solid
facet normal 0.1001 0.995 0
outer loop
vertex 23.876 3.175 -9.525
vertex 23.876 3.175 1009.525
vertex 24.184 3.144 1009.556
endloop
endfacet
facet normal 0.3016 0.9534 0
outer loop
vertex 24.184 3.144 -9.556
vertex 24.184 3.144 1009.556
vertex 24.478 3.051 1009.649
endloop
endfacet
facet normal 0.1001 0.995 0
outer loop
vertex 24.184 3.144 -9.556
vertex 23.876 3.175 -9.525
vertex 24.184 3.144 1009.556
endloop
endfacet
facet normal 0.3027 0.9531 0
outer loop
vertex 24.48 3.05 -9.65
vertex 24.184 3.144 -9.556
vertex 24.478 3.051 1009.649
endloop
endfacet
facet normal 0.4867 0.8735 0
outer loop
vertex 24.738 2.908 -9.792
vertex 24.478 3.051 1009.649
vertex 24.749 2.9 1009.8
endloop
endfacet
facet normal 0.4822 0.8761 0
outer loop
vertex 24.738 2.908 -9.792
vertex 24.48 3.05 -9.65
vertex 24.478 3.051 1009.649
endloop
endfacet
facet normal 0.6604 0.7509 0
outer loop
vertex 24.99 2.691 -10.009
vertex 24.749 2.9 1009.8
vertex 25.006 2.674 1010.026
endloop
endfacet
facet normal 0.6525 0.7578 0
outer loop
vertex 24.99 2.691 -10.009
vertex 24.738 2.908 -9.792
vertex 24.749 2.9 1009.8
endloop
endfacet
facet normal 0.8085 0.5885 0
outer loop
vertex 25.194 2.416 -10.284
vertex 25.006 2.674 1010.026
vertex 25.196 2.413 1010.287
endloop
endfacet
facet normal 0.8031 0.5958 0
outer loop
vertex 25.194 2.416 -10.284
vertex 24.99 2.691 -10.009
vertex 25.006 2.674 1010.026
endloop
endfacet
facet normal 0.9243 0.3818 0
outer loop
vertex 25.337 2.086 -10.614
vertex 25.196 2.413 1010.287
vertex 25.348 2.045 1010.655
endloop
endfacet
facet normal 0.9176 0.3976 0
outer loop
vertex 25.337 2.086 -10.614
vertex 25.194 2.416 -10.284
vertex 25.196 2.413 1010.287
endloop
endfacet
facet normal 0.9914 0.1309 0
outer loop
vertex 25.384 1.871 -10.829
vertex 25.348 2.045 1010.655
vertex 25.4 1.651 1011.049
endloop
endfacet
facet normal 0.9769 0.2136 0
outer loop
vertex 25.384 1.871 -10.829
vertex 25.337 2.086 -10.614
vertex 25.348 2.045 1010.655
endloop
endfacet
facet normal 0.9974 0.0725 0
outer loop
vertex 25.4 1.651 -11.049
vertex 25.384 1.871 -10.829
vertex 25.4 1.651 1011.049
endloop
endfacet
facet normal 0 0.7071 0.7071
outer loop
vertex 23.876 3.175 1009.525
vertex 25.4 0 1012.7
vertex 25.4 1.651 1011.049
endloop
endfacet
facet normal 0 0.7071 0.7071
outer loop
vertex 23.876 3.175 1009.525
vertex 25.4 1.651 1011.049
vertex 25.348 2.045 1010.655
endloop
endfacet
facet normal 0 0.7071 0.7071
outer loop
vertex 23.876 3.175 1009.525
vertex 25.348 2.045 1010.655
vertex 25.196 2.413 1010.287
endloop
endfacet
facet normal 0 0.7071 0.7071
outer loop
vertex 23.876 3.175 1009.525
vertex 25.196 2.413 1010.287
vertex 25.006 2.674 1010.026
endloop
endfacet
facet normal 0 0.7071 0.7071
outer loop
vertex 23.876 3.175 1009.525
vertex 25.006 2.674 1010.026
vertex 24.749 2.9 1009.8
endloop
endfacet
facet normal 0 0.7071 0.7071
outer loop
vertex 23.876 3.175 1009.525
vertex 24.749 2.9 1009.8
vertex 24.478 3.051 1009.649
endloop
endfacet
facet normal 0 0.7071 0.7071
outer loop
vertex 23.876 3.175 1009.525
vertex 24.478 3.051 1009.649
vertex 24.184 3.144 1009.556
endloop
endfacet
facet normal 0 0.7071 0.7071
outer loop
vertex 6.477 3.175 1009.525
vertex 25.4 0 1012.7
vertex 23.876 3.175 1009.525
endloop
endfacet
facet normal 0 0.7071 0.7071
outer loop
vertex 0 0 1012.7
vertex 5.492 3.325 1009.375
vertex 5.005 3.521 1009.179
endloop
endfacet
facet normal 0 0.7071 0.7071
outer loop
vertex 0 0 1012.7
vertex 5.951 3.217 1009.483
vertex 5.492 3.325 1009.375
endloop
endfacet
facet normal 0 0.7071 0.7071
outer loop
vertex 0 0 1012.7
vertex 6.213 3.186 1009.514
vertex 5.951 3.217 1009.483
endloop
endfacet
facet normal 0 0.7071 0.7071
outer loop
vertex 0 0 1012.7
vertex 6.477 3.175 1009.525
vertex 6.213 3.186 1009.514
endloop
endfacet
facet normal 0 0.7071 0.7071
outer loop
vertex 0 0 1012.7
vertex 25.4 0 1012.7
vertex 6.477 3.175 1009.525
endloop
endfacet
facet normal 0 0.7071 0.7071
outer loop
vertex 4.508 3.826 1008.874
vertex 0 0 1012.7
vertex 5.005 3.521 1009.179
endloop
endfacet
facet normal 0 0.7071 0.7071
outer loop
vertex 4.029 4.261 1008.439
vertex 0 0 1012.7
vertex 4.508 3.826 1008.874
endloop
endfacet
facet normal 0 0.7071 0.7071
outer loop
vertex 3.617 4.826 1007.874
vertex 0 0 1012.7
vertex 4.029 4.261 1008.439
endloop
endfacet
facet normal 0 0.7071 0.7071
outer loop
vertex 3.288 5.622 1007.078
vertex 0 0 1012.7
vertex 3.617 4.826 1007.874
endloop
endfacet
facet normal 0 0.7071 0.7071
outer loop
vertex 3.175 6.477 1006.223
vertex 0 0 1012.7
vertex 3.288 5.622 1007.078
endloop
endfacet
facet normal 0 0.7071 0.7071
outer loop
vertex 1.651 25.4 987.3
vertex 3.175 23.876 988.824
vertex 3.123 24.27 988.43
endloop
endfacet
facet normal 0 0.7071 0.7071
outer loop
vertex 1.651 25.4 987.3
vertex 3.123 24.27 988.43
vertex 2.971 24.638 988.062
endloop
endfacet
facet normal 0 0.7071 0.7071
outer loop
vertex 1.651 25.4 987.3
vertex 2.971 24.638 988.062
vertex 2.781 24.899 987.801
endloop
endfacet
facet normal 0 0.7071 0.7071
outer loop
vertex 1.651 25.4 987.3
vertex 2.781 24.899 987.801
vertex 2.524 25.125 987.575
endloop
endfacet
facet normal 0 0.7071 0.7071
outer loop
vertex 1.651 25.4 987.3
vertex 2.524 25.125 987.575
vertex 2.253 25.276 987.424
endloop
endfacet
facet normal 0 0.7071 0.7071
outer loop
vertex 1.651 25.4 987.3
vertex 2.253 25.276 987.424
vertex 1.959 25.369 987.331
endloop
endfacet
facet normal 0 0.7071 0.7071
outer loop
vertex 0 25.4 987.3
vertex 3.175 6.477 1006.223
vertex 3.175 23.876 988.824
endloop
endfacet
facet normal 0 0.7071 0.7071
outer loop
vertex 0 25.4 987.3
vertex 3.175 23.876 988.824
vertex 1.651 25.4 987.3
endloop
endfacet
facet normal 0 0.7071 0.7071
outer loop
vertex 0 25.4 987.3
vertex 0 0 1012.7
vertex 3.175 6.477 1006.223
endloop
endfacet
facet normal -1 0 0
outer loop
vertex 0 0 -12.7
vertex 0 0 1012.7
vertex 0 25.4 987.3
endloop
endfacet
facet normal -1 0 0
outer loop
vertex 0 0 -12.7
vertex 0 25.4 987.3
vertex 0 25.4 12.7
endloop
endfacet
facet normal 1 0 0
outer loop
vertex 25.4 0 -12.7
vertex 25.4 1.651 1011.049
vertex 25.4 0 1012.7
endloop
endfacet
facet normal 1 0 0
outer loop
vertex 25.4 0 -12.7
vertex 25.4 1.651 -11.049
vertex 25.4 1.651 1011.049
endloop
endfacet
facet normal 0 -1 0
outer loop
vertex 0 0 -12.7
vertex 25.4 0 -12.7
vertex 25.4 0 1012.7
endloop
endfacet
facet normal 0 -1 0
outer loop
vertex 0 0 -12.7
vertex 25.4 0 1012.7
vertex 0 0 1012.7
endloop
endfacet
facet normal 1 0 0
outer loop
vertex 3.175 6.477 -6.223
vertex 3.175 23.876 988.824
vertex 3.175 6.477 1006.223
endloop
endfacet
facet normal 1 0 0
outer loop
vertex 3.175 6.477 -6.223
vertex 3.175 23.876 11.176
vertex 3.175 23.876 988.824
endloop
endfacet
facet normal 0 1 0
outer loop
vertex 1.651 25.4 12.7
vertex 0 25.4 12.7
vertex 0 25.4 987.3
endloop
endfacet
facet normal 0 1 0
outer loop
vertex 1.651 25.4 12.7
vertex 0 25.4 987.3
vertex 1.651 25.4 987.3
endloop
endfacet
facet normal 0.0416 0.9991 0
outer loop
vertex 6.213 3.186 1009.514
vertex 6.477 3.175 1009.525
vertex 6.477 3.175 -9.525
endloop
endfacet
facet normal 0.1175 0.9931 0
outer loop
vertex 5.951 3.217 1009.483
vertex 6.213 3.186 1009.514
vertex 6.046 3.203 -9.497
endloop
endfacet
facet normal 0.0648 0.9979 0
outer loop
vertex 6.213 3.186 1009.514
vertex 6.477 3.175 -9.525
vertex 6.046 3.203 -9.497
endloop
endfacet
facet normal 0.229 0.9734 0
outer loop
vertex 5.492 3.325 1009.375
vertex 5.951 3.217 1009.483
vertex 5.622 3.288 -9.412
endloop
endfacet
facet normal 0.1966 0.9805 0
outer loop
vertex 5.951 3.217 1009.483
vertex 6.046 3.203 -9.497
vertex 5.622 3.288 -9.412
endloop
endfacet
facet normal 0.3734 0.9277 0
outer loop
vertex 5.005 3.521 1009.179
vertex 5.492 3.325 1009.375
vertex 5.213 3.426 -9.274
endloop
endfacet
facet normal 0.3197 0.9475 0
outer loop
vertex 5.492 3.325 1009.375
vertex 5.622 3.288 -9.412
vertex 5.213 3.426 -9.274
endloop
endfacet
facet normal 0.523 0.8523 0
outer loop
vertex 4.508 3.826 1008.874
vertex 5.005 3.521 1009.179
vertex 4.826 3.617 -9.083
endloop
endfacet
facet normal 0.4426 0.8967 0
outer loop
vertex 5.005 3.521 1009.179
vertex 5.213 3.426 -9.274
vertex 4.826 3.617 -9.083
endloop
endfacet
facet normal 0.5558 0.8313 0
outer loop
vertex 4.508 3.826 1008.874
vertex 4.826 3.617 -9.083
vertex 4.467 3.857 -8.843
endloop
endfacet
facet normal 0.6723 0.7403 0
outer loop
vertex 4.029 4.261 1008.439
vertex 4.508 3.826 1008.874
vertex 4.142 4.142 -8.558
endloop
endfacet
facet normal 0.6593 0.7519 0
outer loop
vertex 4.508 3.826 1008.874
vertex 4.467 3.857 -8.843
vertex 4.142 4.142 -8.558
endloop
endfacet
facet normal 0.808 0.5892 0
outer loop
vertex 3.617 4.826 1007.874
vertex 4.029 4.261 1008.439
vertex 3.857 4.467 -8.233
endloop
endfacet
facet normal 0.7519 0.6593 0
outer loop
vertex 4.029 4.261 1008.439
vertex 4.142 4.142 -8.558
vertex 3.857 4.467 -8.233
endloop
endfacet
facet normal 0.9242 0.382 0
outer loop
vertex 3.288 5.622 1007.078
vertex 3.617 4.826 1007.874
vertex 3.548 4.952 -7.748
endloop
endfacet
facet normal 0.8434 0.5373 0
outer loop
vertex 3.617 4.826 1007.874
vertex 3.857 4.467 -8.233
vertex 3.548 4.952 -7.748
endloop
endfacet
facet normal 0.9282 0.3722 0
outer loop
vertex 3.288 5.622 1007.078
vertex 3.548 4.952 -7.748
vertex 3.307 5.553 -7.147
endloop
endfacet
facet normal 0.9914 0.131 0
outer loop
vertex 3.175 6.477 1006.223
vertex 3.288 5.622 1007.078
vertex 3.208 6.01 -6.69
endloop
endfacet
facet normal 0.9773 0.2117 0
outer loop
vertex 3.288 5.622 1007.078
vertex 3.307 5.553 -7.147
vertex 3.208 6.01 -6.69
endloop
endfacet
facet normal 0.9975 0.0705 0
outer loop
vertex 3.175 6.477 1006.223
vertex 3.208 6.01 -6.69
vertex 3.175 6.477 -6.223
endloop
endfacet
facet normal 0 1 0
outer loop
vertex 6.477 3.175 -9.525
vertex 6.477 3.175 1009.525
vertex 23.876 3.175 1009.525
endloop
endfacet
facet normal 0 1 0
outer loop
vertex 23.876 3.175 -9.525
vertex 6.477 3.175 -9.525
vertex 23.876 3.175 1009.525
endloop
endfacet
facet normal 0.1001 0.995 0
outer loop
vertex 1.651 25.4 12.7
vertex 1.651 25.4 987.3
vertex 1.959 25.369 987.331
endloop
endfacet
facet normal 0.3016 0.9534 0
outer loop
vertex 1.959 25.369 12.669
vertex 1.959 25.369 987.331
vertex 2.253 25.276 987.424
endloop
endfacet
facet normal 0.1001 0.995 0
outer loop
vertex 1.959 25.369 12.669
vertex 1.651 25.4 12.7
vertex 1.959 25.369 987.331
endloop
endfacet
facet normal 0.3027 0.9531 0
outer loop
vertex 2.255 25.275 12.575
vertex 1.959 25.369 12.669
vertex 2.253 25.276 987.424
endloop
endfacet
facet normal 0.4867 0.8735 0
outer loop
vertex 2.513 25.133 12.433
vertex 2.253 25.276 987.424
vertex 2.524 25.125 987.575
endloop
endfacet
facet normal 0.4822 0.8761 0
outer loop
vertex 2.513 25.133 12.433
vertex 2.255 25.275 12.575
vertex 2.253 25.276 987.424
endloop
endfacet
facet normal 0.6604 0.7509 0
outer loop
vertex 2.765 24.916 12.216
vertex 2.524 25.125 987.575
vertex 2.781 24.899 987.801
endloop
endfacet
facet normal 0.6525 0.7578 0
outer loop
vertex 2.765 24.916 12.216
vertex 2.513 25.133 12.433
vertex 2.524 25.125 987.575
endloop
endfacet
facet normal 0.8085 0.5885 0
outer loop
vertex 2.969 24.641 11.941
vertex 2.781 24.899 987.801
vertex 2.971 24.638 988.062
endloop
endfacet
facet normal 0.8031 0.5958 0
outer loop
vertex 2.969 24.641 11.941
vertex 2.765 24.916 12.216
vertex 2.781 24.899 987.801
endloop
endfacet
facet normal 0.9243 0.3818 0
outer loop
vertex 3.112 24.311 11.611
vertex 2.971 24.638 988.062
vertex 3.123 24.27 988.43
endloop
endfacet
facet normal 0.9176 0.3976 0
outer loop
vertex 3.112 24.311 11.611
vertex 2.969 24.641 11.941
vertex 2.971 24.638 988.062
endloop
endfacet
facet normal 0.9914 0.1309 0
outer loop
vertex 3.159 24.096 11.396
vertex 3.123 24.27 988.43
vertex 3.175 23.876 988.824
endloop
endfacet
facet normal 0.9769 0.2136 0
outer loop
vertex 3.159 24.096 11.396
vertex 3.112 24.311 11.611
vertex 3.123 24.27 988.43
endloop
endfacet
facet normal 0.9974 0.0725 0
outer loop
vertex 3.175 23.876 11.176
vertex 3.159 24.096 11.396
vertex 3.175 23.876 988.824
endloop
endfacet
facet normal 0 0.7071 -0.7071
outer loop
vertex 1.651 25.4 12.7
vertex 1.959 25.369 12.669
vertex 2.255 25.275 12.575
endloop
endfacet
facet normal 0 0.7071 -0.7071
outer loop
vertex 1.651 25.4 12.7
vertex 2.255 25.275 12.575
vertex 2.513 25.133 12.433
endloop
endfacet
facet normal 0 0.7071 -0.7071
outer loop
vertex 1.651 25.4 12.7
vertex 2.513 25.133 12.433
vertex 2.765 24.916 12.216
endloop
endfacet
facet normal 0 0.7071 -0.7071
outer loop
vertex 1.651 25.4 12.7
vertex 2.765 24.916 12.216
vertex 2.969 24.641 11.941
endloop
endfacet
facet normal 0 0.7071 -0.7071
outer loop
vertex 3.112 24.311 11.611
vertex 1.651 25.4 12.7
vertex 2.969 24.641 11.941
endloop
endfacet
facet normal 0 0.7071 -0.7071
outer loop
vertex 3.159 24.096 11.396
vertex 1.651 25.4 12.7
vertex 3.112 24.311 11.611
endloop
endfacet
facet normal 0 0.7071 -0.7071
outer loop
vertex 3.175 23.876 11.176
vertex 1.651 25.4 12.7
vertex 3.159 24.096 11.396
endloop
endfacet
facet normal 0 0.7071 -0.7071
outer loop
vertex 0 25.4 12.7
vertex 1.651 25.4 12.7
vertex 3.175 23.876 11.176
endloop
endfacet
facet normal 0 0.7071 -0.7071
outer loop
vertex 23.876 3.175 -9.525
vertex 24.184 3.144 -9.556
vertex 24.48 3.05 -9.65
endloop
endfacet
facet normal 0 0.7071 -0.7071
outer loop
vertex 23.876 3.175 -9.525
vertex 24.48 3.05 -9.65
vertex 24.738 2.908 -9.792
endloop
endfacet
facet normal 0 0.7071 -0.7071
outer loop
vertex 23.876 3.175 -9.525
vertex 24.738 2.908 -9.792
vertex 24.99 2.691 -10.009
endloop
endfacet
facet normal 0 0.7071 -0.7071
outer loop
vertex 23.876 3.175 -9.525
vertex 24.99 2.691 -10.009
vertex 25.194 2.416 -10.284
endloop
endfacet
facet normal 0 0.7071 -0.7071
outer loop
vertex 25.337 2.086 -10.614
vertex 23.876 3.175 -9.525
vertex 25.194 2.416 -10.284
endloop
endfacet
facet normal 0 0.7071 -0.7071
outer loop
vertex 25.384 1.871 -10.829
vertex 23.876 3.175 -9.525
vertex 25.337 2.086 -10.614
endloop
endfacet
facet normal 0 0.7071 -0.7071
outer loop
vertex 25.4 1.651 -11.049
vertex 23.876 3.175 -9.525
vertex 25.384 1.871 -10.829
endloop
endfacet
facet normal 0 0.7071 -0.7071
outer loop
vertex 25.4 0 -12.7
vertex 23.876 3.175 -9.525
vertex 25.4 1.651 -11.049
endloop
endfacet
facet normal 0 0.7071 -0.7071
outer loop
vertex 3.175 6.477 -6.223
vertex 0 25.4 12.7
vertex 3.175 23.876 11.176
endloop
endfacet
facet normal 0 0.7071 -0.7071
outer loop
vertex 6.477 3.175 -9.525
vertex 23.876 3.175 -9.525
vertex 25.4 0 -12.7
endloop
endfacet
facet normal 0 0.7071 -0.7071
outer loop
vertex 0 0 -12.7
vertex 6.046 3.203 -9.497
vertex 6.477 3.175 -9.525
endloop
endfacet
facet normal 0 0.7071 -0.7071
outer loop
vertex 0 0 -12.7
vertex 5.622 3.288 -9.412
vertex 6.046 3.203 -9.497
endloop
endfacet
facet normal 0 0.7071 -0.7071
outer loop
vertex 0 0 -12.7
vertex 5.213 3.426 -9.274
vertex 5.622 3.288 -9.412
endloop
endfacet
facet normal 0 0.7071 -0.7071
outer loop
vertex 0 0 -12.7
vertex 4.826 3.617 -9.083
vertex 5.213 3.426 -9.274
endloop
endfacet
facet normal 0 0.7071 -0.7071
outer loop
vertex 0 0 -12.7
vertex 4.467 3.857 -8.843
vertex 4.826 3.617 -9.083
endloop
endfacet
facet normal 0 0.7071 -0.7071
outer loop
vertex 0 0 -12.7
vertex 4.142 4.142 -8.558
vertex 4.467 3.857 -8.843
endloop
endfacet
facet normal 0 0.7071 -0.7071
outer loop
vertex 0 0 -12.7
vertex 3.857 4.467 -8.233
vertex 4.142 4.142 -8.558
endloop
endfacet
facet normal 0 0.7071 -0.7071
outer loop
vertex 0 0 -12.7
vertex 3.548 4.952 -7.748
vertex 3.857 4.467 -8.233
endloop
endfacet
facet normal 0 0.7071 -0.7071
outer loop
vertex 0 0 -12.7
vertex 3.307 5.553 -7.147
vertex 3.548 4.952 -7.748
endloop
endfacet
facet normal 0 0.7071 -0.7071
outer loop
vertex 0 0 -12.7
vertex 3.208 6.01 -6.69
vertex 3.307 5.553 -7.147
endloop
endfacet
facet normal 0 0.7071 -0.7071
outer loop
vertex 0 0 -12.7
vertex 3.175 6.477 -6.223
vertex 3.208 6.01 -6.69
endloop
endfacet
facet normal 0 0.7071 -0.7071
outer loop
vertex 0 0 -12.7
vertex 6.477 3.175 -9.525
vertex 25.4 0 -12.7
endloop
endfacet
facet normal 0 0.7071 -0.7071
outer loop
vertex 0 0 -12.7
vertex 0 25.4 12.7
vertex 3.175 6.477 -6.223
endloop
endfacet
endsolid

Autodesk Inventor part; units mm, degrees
ref_plane "Start Plane" through (0, 0, -12.7) normal (0, 0, 1) x (1, 0, 0)
ref_plane "End Plane" through (0, 0, 1012.7) normal (0, 0, 1) x (1, 0, 0)
sketch "Sketch" plane through (0, 0, 0) normal (0, 0, 1) x (1, 0, 0)
  line L0 (25.4, 0) -> (0, 0)
  line L1 (0, 0) -> (0, 25.4)
  line L2 (0, 25.4) -> (1.651, 25.4)
  line L3 (3.175, 23.876) -> (3.175, 6.477)
  line L4 (6.477, 3.175) -> (23.876, 3.175)
  line L5 (25.4, 1.651) -> (25.4, 0)
  line L6 (0, -11.0414) -> (0, 31.5385) construction
  line L7 (-11.0414, 0) -> (31.5385, 0) construction
  arc A0 (3.175, 6.477) -> (6.477, 3.175) centre (6.477, 6.477) ccw
  arc A1 (3.175, 23.876) -> (1.651, 25.4) centre (1.651, 23.876) ccw
  arc A2 (25.4, 1.651) -> (23.876, 3.175) centre (23.876, 1.651) ccw
  line L8 (0, 40.0545) -> (0, -19.5574) construction
  line L9 (-19.5574, 0) -> (40.0545, 0) construction
  point P0 (3.175, 25.4)
  point P1 (3.175, 3.175)
  point P2 (25.4, 3.175)
  dimension "d0" = 25.4
  dimension "d1" = 25.4
  dimension "d2" = 3.175
  dimension "d3" = 3.175
  dimension "d10" = 0
  dimension "d11" = 0
  dimension "d14" = 3.302
  dimension "d15" = 1.524
extrude "Body" add sketch "Sketch" along normal up to surface (1025.4 mm away) from surface at -12.7
sketch "Sketch3" plane through (0, 0, 0) normal (0, 0, 1) x (1, 0, 0)
  line L0 (0, 0) -> (10, 0)
ref_plane "Work Plane3" through (0, 0, 0) normal (0, -1, 0) x (1, 0, 0)
ref_plane "Work Plane4" through (12.7, 0, 1012.7) normal (0, 0.7071, 0.7071) x (1, 0, 0)
split "Split1" plane through (12.7, 0, 1012.7) removes the side toward (0, 0.7071, 0.7071)
ref_plane "Work Plane5" through (12.7, 0, -12.7) normal (0, 0.7071, -0.7071) x (1, 0, 0)
split "Split2" plane through (12.7, 0, -12.7) removes the side toward (0, 0.7071, -0.7071)
sketch "Sketch4" plane through (0, 0, 0) normal (0, -1, 0) x (1, 0, 0)
  line L0 (-2, -12.7) -> (12, -12.7) projected
  line L1 (-2, 1012.7) -> (12, 1012.7) projected
  dimension "d17" = 1025.4
equation "\"d0\" = G_H"
equation "\"d1\" = G_H"
equation "\"d2\" = G_T"
equation "\"d3\" = G_T"
equation "\"d14\" = G_IR"
equation "\"d15\" = G_ER"
equation "\"d4\" = G_L"
equation "\"G_H\" = 25.4"
equation "\"G_T\" = 3.175"
equation "\"G_ER\" = 1.524"
equation "\"G_IR\" = 3.302"
equation "\"G_L\" = d17"
equation "\"ex\" = 0"
equation "\"G_OFFSET_START\" = 12.7"
equation "\"G_OFFSET_END\" = 12.7"
equation "\"d12\" = -G_OFFSET_START"
equation "\"d13\" = G_OFFSET_END + B_L"
equation "\"B_L\" = 1000"
properties part number "AISC - L 1 x 1 x 1/8 - 40.37" material "Steel, Mild"
